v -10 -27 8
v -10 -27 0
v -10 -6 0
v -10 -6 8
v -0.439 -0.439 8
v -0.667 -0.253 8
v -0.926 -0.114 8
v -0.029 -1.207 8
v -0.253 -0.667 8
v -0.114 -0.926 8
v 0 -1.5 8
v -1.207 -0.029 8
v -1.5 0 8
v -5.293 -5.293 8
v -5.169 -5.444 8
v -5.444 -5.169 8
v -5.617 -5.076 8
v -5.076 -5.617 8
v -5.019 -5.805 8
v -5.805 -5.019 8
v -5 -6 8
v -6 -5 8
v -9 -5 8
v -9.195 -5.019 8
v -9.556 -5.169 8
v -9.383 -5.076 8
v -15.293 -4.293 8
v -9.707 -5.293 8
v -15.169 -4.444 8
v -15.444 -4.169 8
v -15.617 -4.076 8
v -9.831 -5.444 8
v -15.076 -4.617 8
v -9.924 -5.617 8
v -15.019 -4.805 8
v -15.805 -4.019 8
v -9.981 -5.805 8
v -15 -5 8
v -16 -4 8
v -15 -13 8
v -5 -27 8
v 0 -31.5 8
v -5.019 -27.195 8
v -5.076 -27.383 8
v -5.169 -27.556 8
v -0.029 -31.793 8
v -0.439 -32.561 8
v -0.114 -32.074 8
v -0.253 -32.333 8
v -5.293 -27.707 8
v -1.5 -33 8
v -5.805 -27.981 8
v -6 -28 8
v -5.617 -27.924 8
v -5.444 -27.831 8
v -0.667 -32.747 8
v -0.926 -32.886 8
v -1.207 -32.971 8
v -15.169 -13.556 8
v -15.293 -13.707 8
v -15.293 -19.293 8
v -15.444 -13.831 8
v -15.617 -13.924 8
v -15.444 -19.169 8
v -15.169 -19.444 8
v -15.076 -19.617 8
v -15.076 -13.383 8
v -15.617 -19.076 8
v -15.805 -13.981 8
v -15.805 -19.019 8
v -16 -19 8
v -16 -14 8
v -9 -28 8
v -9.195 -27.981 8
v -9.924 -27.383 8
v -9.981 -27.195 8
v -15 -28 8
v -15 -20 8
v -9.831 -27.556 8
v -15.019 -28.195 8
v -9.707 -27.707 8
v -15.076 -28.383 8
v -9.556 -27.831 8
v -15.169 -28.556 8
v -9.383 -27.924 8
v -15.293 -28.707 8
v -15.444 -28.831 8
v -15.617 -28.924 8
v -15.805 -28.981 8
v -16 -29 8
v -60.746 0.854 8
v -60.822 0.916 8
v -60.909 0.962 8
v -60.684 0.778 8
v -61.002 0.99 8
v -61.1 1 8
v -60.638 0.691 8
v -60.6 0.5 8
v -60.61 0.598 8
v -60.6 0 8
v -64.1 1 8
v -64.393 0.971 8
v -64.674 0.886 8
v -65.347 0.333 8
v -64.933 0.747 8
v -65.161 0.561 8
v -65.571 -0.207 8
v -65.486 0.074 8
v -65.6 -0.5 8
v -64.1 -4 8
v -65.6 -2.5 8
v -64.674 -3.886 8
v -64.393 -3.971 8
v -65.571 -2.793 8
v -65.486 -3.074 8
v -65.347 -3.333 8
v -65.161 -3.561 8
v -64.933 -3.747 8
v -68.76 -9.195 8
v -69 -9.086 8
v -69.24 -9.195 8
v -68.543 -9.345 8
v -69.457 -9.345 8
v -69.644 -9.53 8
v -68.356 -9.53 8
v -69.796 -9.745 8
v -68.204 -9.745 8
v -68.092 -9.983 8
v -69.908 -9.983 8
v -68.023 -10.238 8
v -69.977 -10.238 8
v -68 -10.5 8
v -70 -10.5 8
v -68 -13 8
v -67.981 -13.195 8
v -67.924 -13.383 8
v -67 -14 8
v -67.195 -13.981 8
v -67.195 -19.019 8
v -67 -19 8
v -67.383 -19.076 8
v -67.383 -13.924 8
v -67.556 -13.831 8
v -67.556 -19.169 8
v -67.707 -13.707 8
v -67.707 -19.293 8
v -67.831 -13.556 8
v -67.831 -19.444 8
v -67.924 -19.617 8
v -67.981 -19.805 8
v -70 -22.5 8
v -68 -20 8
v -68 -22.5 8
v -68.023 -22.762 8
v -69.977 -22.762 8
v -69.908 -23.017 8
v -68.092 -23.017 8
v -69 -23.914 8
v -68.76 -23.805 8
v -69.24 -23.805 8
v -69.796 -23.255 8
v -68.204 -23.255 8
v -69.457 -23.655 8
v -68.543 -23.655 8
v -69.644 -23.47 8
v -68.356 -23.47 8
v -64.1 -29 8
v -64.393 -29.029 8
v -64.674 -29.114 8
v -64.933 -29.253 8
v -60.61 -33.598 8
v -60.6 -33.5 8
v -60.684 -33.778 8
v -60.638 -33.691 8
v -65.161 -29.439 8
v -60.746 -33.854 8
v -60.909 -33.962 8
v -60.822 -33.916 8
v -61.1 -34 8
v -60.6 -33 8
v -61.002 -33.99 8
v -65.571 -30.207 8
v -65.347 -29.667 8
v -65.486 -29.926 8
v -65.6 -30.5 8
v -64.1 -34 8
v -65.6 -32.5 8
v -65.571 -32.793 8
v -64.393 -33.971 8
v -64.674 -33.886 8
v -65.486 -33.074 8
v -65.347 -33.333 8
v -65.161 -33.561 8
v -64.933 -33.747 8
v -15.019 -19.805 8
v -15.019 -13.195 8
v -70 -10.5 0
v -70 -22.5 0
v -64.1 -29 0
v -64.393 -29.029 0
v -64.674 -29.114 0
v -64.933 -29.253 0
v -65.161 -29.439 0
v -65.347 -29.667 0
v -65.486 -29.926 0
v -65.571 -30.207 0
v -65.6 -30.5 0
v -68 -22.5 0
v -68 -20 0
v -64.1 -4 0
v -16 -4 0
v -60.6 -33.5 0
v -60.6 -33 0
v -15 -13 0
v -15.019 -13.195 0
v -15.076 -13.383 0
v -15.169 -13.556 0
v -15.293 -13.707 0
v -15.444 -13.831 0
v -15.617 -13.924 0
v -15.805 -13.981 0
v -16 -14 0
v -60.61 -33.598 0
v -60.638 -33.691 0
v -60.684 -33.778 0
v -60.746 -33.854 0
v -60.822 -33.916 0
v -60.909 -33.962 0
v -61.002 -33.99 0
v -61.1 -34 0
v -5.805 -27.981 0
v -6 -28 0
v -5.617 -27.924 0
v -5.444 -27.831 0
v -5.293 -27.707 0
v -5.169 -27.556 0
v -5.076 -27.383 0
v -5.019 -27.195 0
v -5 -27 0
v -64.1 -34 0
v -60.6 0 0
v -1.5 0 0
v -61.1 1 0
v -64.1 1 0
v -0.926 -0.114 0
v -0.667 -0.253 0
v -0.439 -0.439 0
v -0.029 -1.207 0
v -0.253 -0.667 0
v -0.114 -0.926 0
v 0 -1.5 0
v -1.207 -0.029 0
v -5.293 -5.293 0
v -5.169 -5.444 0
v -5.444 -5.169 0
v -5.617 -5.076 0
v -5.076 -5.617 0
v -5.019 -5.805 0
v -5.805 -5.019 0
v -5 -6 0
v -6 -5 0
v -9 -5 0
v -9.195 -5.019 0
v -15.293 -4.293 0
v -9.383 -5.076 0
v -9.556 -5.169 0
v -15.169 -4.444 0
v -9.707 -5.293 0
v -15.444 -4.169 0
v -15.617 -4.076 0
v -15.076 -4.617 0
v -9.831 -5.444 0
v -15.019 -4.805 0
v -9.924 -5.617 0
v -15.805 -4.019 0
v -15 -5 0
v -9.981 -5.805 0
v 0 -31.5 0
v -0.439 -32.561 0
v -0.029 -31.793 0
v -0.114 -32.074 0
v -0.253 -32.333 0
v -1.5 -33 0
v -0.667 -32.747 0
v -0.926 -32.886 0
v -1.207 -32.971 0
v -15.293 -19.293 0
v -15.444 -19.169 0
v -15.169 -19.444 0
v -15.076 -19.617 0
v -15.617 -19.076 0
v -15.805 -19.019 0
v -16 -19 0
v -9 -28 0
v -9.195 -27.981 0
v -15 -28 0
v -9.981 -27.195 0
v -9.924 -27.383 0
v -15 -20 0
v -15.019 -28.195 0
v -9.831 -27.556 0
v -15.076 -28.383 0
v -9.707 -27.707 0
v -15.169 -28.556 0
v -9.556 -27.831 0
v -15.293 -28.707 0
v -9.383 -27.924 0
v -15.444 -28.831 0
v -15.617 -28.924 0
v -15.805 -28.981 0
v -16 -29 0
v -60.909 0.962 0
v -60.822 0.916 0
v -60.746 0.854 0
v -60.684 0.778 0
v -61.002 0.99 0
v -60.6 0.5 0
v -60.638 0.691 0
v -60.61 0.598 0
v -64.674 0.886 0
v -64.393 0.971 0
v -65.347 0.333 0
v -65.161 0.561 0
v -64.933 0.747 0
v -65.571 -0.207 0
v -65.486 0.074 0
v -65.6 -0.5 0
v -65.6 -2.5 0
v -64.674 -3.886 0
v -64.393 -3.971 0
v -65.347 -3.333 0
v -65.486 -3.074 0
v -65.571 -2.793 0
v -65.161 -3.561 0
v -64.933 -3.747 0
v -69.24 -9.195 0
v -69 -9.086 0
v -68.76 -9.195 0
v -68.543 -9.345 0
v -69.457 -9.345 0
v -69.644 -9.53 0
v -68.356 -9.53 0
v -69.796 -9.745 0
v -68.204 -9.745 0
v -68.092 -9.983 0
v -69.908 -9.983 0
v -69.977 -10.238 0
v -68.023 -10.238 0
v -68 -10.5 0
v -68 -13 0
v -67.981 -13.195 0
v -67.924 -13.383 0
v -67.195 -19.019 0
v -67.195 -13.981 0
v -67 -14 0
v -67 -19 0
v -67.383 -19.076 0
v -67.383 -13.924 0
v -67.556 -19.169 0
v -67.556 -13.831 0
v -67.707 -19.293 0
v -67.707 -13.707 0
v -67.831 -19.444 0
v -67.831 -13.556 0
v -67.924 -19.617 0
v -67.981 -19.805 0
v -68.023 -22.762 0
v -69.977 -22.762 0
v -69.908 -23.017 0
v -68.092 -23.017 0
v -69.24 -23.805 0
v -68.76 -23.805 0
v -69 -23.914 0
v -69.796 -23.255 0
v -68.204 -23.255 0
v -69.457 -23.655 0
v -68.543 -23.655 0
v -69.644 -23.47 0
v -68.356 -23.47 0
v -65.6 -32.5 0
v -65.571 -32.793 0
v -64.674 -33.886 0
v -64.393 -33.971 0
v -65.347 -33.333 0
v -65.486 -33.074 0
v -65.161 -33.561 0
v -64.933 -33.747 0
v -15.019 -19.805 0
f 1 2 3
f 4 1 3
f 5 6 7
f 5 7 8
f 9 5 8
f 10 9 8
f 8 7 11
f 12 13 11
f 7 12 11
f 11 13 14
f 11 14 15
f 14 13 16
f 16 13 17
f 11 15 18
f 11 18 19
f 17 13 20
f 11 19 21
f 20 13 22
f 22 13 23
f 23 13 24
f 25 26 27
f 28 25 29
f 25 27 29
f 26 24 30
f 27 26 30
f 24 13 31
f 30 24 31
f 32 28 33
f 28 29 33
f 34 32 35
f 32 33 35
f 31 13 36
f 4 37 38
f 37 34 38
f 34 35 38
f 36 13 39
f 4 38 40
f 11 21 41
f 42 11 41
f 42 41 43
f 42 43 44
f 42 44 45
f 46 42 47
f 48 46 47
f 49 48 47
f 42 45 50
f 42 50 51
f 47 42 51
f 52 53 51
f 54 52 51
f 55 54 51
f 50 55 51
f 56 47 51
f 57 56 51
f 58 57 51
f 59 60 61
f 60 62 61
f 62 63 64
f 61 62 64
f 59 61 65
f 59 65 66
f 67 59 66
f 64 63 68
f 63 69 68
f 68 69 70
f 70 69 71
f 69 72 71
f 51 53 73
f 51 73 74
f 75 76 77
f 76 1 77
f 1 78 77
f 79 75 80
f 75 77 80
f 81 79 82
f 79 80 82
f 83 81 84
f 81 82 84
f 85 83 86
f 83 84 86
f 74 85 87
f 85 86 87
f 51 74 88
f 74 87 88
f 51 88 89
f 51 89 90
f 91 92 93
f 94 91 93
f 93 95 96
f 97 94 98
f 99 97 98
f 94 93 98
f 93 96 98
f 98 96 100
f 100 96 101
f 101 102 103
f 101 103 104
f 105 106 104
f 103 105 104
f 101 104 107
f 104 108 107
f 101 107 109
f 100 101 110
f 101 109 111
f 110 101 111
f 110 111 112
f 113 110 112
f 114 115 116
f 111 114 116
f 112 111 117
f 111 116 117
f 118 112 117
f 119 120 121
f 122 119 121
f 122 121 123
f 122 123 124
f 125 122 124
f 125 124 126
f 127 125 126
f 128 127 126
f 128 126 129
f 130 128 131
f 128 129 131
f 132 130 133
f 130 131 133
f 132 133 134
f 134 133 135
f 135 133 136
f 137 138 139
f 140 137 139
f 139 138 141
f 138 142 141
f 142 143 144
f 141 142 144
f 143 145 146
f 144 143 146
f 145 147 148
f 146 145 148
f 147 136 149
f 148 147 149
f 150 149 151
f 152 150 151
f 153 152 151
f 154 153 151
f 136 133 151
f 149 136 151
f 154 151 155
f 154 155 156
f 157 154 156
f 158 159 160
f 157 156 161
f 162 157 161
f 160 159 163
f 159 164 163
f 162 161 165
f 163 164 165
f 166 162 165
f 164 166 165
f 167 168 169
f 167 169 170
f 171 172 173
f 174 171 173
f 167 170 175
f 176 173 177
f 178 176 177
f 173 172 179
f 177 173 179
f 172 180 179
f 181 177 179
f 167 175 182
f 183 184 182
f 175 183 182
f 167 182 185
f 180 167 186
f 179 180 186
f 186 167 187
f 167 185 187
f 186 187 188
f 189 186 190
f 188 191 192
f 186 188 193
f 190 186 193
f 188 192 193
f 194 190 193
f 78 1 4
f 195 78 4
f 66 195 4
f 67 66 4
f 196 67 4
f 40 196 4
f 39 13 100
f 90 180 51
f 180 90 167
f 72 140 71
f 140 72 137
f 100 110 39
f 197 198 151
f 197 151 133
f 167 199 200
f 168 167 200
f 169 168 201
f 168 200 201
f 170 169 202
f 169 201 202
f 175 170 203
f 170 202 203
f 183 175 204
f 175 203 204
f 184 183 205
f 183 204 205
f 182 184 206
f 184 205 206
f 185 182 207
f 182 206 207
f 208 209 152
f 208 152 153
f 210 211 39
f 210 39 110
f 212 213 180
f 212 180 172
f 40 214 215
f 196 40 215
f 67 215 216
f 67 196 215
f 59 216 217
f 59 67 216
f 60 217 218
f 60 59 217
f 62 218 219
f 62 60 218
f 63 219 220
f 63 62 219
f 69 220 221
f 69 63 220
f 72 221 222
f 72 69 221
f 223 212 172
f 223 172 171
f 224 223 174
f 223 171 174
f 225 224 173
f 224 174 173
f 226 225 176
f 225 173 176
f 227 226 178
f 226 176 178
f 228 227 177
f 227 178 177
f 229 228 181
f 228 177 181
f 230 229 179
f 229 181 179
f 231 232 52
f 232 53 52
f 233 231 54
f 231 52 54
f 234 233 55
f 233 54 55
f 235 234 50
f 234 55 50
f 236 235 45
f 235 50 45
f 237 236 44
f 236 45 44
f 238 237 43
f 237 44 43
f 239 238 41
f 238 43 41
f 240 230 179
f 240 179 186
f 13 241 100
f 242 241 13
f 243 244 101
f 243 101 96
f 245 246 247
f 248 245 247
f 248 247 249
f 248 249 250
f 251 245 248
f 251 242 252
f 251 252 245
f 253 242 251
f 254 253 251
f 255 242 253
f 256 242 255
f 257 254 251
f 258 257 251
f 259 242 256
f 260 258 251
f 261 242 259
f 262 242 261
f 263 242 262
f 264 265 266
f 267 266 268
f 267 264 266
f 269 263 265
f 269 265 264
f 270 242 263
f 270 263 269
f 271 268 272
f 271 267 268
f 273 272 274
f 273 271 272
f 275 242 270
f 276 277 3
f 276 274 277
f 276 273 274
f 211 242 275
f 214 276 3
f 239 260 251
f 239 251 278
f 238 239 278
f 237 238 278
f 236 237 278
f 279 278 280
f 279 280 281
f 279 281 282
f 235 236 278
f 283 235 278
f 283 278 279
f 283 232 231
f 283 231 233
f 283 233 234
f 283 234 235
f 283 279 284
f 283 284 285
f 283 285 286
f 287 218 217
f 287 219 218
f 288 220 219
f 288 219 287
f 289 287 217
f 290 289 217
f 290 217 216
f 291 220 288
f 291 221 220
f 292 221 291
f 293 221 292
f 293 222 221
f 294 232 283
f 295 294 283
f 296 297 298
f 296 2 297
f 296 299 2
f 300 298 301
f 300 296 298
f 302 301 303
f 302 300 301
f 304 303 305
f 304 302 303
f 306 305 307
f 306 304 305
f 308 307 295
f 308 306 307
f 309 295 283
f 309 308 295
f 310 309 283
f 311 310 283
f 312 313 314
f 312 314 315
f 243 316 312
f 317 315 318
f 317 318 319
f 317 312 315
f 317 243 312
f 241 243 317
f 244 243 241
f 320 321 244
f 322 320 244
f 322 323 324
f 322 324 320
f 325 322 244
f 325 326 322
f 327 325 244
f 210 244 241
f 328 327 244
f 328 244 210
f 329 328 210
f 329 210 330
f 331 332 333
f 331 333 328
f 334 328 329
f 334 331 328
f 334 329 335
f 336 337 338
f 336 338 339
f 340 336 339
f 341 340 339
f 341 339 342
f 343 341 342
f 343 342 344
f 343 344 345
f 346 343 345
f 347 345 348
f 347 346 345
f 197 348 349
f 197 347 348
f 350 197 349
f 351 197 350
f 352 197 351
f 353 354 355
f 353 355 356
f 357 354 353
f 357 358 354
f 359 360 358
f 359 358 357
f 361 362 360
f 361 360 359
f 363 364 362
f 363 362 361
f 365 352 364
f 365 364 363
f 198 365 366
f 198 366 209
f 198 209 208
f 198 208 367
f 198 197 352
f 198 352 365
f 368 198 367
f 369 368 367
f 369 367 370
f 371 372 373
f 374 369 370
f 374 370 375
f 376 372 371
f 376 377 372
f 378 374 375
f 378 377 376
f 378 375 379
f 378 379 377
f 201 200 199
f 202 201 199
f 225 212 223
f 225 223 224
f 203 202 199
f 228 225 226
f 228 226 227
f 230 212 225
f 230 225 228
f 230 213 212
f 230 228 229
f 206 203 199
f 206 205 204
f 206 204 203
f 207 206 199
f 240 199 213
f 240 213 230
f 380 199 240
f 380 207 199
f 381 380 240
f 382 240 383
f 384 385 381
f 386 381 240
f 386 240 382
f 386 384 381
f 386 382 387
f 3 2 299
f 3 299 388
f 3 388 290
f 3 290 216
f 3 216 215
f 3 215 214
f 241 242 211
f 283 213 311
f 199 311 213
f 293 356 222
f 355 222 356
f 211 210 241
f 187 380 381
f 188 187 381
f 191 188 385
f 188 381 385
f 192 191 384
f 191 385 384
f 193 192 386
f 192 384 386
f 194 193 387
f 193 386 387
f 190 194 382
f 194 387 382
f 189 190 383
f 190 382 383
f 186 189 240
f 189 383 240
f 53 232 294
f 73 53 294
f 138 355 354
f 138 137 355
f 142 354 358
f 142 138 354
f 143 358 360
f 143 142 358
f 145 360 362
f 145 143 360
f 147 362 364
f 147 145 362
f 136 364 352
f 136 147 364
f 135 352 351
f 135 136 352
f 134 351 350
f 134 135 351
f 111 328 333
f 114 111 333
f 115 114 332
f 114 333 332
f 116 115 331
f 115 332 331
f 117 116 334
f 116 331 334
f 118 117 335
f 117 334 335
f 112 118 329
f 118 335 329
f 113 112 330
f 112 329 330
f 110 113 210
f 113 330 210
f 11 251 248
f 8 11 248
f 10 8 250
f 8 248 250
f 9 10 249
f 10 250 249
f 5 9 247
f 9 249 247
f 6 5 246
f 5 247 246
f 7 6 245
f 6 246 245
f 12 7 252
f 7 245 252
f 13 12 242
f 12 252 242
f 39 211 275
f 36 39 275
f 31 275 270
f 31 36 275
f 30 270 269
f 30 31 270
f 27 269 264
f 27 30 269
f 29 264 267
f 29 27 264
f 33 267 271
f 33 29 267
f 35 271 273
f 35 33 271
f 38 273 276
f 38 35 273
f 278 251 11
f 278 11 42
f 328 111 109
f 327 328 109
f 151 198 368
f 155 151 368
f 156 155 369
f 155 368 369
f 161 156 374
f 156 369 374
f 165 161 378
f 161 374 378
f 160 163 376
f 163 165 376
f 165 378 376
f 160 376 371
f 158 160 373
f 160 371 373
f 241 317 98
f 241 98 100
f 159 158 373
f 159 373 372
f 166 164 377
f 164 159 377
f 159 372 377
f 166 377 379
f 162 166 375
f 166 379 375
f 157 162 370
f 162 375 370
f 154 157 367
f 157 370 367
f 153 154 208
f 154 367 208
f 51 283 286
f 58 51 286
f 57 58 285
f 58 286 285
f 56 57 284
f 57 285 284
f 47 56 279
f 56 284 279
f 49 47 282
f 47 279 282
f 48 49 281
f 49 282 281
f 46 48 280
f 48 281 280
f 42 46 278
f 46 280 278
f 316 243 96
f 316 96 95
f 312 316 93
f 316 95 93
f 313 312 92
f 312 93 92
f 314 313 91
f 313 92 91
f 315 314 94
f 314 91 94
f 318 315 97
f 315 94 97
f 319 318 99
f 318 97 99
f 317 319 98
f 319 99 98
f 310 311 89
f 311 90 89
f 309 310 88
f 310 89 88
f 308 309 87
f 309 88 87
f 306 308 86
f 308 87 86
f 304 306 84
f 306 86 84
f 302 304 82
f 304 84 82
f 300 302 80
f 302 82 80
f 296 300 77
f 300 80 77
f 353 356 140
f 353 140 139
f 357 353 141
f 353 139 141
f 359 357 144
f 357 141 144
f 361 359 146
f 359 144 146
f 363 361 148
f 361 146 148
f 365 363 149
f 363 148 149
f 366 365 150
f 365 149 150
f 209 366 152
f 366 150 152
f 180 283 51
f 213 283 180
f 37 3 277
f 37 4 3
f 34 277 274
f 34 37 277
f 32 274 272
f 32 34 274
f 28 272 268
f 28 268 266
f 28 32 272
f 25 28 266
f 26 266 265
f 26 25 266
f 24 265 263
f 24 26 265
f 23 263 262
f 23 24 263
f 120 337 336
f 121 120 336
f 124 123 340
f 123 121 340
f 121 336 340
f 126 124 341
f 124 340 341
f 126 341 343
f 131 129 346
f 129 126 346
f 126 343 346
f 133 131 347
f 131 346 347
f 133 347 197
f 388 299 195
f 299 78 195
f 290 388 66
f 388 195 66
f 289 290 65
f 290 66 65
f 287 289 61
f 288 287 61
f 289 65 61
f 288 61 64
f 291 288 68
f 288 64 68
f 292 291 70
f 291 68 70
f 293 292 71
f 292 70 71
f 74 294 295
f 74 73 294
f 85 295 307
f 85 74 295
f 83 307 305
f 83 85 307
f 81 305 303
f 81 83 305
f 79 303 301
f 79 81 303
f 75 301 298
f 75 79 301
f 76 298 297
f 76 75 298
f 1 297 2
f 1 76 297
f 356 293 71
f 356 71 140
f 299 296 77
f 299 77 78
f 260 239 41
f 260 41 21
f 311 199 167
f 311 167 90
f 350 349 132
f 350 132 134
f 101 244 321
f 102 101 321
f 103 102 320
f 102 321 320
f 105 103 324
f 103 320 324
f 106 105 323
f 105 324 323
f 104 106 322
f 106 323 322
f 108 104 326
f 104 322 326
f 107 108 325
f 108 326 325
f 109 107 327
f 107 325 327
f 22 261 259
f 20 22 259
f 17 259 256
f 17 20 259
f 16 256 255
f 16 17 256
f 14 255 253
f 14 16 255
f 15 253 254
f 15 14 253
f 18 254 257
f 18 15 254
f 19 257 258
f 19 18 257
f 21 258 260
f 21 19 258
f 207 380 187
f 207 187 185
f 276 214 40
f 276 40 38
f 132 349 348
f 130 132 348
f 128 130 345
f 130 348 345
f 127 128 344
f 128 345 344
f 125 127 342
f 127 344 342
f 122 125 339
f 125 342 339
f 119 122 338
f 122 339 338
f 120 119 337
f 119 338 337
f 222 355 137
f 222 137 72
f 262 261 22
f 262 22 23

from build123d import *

# Parameters (mm, degrees)
SKETCH1_W           = 23
SKETCH1_H           = 5
BOSS_EXTRUDE2_DEPTH = 8
FILLET1_R           = 1
FILLET2_R           = 0.5
FILLET3_R           = 1.5


with BuildPart() as part:
    # Sketch1 → Boss-Extrude2 (new body)
    with BuildSketch(Plane(origin=(0, 0, 0), x_dir=(0, 1, 0), z_dir=(0, 0, 1))):
        Polygon((0, 0), (-33, 0), (-33, 60.6), (-34, 60.6), (-34, 65.6), (-29, 65.6), (-29, 15), (-19, 15), (-19, 68), (-24, 68), (-24, 70), (-9, 70), (-9, 68), (-14, 68), (-14, 15), (-4, 15), (-4, 65.6), (1, 65.6), (1, 60.6), (0, 60.6), align=None)
        with Locations((-16.5, 7.5)):
            Rectangle(SKETCH1_W, SKETCH1_H, mode=Mode.SUBTRACT)
    extrude(amount=BOSS_EXTRUDE2_DEPTH)

    # Fillet1
    fillet1_edges = [part.edges().sort_by_distance(p)[0] for p in [
        (-15, -29, 4),
        (-15, -19, 4),
        (-68, -19, 4),
        (-68, -14, 4),
        (-15, -14, 4),
        (-15, -4, 4),
        (-10, -5, 4),
        (-10, -28, 4),
        (-5, -28, 4),
        (-5, -5, 4),
    ]]
    fillet(fillet1_edges, radius=FILLET1_R)

    # Fillet2
    fillet2_edges = [part.edges().sort_by_distance(p)[0] for p in [
        (-60.6, -34, 4),
        (-60.6, 1, 4),
    ]]
    fillet(fillet2_edges, radius=FILLET2_R)

    # Fillet3
    # the kernel refuses this fillet: 1.5 mm, written as the material it takes off along each edge
    with BuildSketch(Plane(origin=(-70, -24, -3.75), x_dir=(1, 0, 0), z_dir=(0, 0, 1)), Plane(origin=(-70, -9, -3.75), x_dir=(0, -1, 0), z_dir=(0, 0, 1)), Plane(origin=(-68, -9, -3.75), x_dir=(-1, 0, 0), z_dir=(0, 0, 1)), Plane(origin=(-68, -24, -3.75), x_dir=(0, 1, 0), z_dir=(0, 0, 1)), Plane(origin=(-65.6, -29, -3.75), x_dir=(0, -1, 0), z_dir=(0, 0, 1)), Plane(origin=(-65.6, -34, -3.75), x_dir=(1, 0, 0), z_dir=(0, 0, 1))) as fillet3_piece_1:
        with BuildLine():
            CenterArc((FILLET3_R, FILLET3_R), FILLET3_R, 180, 90)
            Line((0, FILLET3_R), (0, 0))
            Line((0, 0), (FILLET3_R, 0))
        make_face()
    extrude(amount=15.5, mode=Mode.SUBTRACT)
    with BuildSketch(Plane(origin=(0, -33, -3.75), x_dir=(-1, 0, 0), z_dir=(0, 0, 1)), Plane(origin=(0, 0, -3.75), x_dir=(0, -1, 0), z_dir=(0, 0, 1)), Plane(origin=(-65.6, 1, -3.75), x_dir=(1, 0, 0), z_dir=(0, 0, 1)), Plane(origin=(-65.6, -4, -3.75), x_dir=(0, 1, 0), z_dir=(0, 0, 1))) as fillet3_piece_2:
        with BuildLine():
            CenterArc((FILLET3_R, -FILLET3_R), FILLET3_R, 90, 90)
            Line((0, -FILLET3_R), (0, 0))
            Line((0, 0), (FILLET3_R, 0))
        make_face()
    extrude(amount=15.5, mode=Mode.SUBTRACT)


solid = part.part
